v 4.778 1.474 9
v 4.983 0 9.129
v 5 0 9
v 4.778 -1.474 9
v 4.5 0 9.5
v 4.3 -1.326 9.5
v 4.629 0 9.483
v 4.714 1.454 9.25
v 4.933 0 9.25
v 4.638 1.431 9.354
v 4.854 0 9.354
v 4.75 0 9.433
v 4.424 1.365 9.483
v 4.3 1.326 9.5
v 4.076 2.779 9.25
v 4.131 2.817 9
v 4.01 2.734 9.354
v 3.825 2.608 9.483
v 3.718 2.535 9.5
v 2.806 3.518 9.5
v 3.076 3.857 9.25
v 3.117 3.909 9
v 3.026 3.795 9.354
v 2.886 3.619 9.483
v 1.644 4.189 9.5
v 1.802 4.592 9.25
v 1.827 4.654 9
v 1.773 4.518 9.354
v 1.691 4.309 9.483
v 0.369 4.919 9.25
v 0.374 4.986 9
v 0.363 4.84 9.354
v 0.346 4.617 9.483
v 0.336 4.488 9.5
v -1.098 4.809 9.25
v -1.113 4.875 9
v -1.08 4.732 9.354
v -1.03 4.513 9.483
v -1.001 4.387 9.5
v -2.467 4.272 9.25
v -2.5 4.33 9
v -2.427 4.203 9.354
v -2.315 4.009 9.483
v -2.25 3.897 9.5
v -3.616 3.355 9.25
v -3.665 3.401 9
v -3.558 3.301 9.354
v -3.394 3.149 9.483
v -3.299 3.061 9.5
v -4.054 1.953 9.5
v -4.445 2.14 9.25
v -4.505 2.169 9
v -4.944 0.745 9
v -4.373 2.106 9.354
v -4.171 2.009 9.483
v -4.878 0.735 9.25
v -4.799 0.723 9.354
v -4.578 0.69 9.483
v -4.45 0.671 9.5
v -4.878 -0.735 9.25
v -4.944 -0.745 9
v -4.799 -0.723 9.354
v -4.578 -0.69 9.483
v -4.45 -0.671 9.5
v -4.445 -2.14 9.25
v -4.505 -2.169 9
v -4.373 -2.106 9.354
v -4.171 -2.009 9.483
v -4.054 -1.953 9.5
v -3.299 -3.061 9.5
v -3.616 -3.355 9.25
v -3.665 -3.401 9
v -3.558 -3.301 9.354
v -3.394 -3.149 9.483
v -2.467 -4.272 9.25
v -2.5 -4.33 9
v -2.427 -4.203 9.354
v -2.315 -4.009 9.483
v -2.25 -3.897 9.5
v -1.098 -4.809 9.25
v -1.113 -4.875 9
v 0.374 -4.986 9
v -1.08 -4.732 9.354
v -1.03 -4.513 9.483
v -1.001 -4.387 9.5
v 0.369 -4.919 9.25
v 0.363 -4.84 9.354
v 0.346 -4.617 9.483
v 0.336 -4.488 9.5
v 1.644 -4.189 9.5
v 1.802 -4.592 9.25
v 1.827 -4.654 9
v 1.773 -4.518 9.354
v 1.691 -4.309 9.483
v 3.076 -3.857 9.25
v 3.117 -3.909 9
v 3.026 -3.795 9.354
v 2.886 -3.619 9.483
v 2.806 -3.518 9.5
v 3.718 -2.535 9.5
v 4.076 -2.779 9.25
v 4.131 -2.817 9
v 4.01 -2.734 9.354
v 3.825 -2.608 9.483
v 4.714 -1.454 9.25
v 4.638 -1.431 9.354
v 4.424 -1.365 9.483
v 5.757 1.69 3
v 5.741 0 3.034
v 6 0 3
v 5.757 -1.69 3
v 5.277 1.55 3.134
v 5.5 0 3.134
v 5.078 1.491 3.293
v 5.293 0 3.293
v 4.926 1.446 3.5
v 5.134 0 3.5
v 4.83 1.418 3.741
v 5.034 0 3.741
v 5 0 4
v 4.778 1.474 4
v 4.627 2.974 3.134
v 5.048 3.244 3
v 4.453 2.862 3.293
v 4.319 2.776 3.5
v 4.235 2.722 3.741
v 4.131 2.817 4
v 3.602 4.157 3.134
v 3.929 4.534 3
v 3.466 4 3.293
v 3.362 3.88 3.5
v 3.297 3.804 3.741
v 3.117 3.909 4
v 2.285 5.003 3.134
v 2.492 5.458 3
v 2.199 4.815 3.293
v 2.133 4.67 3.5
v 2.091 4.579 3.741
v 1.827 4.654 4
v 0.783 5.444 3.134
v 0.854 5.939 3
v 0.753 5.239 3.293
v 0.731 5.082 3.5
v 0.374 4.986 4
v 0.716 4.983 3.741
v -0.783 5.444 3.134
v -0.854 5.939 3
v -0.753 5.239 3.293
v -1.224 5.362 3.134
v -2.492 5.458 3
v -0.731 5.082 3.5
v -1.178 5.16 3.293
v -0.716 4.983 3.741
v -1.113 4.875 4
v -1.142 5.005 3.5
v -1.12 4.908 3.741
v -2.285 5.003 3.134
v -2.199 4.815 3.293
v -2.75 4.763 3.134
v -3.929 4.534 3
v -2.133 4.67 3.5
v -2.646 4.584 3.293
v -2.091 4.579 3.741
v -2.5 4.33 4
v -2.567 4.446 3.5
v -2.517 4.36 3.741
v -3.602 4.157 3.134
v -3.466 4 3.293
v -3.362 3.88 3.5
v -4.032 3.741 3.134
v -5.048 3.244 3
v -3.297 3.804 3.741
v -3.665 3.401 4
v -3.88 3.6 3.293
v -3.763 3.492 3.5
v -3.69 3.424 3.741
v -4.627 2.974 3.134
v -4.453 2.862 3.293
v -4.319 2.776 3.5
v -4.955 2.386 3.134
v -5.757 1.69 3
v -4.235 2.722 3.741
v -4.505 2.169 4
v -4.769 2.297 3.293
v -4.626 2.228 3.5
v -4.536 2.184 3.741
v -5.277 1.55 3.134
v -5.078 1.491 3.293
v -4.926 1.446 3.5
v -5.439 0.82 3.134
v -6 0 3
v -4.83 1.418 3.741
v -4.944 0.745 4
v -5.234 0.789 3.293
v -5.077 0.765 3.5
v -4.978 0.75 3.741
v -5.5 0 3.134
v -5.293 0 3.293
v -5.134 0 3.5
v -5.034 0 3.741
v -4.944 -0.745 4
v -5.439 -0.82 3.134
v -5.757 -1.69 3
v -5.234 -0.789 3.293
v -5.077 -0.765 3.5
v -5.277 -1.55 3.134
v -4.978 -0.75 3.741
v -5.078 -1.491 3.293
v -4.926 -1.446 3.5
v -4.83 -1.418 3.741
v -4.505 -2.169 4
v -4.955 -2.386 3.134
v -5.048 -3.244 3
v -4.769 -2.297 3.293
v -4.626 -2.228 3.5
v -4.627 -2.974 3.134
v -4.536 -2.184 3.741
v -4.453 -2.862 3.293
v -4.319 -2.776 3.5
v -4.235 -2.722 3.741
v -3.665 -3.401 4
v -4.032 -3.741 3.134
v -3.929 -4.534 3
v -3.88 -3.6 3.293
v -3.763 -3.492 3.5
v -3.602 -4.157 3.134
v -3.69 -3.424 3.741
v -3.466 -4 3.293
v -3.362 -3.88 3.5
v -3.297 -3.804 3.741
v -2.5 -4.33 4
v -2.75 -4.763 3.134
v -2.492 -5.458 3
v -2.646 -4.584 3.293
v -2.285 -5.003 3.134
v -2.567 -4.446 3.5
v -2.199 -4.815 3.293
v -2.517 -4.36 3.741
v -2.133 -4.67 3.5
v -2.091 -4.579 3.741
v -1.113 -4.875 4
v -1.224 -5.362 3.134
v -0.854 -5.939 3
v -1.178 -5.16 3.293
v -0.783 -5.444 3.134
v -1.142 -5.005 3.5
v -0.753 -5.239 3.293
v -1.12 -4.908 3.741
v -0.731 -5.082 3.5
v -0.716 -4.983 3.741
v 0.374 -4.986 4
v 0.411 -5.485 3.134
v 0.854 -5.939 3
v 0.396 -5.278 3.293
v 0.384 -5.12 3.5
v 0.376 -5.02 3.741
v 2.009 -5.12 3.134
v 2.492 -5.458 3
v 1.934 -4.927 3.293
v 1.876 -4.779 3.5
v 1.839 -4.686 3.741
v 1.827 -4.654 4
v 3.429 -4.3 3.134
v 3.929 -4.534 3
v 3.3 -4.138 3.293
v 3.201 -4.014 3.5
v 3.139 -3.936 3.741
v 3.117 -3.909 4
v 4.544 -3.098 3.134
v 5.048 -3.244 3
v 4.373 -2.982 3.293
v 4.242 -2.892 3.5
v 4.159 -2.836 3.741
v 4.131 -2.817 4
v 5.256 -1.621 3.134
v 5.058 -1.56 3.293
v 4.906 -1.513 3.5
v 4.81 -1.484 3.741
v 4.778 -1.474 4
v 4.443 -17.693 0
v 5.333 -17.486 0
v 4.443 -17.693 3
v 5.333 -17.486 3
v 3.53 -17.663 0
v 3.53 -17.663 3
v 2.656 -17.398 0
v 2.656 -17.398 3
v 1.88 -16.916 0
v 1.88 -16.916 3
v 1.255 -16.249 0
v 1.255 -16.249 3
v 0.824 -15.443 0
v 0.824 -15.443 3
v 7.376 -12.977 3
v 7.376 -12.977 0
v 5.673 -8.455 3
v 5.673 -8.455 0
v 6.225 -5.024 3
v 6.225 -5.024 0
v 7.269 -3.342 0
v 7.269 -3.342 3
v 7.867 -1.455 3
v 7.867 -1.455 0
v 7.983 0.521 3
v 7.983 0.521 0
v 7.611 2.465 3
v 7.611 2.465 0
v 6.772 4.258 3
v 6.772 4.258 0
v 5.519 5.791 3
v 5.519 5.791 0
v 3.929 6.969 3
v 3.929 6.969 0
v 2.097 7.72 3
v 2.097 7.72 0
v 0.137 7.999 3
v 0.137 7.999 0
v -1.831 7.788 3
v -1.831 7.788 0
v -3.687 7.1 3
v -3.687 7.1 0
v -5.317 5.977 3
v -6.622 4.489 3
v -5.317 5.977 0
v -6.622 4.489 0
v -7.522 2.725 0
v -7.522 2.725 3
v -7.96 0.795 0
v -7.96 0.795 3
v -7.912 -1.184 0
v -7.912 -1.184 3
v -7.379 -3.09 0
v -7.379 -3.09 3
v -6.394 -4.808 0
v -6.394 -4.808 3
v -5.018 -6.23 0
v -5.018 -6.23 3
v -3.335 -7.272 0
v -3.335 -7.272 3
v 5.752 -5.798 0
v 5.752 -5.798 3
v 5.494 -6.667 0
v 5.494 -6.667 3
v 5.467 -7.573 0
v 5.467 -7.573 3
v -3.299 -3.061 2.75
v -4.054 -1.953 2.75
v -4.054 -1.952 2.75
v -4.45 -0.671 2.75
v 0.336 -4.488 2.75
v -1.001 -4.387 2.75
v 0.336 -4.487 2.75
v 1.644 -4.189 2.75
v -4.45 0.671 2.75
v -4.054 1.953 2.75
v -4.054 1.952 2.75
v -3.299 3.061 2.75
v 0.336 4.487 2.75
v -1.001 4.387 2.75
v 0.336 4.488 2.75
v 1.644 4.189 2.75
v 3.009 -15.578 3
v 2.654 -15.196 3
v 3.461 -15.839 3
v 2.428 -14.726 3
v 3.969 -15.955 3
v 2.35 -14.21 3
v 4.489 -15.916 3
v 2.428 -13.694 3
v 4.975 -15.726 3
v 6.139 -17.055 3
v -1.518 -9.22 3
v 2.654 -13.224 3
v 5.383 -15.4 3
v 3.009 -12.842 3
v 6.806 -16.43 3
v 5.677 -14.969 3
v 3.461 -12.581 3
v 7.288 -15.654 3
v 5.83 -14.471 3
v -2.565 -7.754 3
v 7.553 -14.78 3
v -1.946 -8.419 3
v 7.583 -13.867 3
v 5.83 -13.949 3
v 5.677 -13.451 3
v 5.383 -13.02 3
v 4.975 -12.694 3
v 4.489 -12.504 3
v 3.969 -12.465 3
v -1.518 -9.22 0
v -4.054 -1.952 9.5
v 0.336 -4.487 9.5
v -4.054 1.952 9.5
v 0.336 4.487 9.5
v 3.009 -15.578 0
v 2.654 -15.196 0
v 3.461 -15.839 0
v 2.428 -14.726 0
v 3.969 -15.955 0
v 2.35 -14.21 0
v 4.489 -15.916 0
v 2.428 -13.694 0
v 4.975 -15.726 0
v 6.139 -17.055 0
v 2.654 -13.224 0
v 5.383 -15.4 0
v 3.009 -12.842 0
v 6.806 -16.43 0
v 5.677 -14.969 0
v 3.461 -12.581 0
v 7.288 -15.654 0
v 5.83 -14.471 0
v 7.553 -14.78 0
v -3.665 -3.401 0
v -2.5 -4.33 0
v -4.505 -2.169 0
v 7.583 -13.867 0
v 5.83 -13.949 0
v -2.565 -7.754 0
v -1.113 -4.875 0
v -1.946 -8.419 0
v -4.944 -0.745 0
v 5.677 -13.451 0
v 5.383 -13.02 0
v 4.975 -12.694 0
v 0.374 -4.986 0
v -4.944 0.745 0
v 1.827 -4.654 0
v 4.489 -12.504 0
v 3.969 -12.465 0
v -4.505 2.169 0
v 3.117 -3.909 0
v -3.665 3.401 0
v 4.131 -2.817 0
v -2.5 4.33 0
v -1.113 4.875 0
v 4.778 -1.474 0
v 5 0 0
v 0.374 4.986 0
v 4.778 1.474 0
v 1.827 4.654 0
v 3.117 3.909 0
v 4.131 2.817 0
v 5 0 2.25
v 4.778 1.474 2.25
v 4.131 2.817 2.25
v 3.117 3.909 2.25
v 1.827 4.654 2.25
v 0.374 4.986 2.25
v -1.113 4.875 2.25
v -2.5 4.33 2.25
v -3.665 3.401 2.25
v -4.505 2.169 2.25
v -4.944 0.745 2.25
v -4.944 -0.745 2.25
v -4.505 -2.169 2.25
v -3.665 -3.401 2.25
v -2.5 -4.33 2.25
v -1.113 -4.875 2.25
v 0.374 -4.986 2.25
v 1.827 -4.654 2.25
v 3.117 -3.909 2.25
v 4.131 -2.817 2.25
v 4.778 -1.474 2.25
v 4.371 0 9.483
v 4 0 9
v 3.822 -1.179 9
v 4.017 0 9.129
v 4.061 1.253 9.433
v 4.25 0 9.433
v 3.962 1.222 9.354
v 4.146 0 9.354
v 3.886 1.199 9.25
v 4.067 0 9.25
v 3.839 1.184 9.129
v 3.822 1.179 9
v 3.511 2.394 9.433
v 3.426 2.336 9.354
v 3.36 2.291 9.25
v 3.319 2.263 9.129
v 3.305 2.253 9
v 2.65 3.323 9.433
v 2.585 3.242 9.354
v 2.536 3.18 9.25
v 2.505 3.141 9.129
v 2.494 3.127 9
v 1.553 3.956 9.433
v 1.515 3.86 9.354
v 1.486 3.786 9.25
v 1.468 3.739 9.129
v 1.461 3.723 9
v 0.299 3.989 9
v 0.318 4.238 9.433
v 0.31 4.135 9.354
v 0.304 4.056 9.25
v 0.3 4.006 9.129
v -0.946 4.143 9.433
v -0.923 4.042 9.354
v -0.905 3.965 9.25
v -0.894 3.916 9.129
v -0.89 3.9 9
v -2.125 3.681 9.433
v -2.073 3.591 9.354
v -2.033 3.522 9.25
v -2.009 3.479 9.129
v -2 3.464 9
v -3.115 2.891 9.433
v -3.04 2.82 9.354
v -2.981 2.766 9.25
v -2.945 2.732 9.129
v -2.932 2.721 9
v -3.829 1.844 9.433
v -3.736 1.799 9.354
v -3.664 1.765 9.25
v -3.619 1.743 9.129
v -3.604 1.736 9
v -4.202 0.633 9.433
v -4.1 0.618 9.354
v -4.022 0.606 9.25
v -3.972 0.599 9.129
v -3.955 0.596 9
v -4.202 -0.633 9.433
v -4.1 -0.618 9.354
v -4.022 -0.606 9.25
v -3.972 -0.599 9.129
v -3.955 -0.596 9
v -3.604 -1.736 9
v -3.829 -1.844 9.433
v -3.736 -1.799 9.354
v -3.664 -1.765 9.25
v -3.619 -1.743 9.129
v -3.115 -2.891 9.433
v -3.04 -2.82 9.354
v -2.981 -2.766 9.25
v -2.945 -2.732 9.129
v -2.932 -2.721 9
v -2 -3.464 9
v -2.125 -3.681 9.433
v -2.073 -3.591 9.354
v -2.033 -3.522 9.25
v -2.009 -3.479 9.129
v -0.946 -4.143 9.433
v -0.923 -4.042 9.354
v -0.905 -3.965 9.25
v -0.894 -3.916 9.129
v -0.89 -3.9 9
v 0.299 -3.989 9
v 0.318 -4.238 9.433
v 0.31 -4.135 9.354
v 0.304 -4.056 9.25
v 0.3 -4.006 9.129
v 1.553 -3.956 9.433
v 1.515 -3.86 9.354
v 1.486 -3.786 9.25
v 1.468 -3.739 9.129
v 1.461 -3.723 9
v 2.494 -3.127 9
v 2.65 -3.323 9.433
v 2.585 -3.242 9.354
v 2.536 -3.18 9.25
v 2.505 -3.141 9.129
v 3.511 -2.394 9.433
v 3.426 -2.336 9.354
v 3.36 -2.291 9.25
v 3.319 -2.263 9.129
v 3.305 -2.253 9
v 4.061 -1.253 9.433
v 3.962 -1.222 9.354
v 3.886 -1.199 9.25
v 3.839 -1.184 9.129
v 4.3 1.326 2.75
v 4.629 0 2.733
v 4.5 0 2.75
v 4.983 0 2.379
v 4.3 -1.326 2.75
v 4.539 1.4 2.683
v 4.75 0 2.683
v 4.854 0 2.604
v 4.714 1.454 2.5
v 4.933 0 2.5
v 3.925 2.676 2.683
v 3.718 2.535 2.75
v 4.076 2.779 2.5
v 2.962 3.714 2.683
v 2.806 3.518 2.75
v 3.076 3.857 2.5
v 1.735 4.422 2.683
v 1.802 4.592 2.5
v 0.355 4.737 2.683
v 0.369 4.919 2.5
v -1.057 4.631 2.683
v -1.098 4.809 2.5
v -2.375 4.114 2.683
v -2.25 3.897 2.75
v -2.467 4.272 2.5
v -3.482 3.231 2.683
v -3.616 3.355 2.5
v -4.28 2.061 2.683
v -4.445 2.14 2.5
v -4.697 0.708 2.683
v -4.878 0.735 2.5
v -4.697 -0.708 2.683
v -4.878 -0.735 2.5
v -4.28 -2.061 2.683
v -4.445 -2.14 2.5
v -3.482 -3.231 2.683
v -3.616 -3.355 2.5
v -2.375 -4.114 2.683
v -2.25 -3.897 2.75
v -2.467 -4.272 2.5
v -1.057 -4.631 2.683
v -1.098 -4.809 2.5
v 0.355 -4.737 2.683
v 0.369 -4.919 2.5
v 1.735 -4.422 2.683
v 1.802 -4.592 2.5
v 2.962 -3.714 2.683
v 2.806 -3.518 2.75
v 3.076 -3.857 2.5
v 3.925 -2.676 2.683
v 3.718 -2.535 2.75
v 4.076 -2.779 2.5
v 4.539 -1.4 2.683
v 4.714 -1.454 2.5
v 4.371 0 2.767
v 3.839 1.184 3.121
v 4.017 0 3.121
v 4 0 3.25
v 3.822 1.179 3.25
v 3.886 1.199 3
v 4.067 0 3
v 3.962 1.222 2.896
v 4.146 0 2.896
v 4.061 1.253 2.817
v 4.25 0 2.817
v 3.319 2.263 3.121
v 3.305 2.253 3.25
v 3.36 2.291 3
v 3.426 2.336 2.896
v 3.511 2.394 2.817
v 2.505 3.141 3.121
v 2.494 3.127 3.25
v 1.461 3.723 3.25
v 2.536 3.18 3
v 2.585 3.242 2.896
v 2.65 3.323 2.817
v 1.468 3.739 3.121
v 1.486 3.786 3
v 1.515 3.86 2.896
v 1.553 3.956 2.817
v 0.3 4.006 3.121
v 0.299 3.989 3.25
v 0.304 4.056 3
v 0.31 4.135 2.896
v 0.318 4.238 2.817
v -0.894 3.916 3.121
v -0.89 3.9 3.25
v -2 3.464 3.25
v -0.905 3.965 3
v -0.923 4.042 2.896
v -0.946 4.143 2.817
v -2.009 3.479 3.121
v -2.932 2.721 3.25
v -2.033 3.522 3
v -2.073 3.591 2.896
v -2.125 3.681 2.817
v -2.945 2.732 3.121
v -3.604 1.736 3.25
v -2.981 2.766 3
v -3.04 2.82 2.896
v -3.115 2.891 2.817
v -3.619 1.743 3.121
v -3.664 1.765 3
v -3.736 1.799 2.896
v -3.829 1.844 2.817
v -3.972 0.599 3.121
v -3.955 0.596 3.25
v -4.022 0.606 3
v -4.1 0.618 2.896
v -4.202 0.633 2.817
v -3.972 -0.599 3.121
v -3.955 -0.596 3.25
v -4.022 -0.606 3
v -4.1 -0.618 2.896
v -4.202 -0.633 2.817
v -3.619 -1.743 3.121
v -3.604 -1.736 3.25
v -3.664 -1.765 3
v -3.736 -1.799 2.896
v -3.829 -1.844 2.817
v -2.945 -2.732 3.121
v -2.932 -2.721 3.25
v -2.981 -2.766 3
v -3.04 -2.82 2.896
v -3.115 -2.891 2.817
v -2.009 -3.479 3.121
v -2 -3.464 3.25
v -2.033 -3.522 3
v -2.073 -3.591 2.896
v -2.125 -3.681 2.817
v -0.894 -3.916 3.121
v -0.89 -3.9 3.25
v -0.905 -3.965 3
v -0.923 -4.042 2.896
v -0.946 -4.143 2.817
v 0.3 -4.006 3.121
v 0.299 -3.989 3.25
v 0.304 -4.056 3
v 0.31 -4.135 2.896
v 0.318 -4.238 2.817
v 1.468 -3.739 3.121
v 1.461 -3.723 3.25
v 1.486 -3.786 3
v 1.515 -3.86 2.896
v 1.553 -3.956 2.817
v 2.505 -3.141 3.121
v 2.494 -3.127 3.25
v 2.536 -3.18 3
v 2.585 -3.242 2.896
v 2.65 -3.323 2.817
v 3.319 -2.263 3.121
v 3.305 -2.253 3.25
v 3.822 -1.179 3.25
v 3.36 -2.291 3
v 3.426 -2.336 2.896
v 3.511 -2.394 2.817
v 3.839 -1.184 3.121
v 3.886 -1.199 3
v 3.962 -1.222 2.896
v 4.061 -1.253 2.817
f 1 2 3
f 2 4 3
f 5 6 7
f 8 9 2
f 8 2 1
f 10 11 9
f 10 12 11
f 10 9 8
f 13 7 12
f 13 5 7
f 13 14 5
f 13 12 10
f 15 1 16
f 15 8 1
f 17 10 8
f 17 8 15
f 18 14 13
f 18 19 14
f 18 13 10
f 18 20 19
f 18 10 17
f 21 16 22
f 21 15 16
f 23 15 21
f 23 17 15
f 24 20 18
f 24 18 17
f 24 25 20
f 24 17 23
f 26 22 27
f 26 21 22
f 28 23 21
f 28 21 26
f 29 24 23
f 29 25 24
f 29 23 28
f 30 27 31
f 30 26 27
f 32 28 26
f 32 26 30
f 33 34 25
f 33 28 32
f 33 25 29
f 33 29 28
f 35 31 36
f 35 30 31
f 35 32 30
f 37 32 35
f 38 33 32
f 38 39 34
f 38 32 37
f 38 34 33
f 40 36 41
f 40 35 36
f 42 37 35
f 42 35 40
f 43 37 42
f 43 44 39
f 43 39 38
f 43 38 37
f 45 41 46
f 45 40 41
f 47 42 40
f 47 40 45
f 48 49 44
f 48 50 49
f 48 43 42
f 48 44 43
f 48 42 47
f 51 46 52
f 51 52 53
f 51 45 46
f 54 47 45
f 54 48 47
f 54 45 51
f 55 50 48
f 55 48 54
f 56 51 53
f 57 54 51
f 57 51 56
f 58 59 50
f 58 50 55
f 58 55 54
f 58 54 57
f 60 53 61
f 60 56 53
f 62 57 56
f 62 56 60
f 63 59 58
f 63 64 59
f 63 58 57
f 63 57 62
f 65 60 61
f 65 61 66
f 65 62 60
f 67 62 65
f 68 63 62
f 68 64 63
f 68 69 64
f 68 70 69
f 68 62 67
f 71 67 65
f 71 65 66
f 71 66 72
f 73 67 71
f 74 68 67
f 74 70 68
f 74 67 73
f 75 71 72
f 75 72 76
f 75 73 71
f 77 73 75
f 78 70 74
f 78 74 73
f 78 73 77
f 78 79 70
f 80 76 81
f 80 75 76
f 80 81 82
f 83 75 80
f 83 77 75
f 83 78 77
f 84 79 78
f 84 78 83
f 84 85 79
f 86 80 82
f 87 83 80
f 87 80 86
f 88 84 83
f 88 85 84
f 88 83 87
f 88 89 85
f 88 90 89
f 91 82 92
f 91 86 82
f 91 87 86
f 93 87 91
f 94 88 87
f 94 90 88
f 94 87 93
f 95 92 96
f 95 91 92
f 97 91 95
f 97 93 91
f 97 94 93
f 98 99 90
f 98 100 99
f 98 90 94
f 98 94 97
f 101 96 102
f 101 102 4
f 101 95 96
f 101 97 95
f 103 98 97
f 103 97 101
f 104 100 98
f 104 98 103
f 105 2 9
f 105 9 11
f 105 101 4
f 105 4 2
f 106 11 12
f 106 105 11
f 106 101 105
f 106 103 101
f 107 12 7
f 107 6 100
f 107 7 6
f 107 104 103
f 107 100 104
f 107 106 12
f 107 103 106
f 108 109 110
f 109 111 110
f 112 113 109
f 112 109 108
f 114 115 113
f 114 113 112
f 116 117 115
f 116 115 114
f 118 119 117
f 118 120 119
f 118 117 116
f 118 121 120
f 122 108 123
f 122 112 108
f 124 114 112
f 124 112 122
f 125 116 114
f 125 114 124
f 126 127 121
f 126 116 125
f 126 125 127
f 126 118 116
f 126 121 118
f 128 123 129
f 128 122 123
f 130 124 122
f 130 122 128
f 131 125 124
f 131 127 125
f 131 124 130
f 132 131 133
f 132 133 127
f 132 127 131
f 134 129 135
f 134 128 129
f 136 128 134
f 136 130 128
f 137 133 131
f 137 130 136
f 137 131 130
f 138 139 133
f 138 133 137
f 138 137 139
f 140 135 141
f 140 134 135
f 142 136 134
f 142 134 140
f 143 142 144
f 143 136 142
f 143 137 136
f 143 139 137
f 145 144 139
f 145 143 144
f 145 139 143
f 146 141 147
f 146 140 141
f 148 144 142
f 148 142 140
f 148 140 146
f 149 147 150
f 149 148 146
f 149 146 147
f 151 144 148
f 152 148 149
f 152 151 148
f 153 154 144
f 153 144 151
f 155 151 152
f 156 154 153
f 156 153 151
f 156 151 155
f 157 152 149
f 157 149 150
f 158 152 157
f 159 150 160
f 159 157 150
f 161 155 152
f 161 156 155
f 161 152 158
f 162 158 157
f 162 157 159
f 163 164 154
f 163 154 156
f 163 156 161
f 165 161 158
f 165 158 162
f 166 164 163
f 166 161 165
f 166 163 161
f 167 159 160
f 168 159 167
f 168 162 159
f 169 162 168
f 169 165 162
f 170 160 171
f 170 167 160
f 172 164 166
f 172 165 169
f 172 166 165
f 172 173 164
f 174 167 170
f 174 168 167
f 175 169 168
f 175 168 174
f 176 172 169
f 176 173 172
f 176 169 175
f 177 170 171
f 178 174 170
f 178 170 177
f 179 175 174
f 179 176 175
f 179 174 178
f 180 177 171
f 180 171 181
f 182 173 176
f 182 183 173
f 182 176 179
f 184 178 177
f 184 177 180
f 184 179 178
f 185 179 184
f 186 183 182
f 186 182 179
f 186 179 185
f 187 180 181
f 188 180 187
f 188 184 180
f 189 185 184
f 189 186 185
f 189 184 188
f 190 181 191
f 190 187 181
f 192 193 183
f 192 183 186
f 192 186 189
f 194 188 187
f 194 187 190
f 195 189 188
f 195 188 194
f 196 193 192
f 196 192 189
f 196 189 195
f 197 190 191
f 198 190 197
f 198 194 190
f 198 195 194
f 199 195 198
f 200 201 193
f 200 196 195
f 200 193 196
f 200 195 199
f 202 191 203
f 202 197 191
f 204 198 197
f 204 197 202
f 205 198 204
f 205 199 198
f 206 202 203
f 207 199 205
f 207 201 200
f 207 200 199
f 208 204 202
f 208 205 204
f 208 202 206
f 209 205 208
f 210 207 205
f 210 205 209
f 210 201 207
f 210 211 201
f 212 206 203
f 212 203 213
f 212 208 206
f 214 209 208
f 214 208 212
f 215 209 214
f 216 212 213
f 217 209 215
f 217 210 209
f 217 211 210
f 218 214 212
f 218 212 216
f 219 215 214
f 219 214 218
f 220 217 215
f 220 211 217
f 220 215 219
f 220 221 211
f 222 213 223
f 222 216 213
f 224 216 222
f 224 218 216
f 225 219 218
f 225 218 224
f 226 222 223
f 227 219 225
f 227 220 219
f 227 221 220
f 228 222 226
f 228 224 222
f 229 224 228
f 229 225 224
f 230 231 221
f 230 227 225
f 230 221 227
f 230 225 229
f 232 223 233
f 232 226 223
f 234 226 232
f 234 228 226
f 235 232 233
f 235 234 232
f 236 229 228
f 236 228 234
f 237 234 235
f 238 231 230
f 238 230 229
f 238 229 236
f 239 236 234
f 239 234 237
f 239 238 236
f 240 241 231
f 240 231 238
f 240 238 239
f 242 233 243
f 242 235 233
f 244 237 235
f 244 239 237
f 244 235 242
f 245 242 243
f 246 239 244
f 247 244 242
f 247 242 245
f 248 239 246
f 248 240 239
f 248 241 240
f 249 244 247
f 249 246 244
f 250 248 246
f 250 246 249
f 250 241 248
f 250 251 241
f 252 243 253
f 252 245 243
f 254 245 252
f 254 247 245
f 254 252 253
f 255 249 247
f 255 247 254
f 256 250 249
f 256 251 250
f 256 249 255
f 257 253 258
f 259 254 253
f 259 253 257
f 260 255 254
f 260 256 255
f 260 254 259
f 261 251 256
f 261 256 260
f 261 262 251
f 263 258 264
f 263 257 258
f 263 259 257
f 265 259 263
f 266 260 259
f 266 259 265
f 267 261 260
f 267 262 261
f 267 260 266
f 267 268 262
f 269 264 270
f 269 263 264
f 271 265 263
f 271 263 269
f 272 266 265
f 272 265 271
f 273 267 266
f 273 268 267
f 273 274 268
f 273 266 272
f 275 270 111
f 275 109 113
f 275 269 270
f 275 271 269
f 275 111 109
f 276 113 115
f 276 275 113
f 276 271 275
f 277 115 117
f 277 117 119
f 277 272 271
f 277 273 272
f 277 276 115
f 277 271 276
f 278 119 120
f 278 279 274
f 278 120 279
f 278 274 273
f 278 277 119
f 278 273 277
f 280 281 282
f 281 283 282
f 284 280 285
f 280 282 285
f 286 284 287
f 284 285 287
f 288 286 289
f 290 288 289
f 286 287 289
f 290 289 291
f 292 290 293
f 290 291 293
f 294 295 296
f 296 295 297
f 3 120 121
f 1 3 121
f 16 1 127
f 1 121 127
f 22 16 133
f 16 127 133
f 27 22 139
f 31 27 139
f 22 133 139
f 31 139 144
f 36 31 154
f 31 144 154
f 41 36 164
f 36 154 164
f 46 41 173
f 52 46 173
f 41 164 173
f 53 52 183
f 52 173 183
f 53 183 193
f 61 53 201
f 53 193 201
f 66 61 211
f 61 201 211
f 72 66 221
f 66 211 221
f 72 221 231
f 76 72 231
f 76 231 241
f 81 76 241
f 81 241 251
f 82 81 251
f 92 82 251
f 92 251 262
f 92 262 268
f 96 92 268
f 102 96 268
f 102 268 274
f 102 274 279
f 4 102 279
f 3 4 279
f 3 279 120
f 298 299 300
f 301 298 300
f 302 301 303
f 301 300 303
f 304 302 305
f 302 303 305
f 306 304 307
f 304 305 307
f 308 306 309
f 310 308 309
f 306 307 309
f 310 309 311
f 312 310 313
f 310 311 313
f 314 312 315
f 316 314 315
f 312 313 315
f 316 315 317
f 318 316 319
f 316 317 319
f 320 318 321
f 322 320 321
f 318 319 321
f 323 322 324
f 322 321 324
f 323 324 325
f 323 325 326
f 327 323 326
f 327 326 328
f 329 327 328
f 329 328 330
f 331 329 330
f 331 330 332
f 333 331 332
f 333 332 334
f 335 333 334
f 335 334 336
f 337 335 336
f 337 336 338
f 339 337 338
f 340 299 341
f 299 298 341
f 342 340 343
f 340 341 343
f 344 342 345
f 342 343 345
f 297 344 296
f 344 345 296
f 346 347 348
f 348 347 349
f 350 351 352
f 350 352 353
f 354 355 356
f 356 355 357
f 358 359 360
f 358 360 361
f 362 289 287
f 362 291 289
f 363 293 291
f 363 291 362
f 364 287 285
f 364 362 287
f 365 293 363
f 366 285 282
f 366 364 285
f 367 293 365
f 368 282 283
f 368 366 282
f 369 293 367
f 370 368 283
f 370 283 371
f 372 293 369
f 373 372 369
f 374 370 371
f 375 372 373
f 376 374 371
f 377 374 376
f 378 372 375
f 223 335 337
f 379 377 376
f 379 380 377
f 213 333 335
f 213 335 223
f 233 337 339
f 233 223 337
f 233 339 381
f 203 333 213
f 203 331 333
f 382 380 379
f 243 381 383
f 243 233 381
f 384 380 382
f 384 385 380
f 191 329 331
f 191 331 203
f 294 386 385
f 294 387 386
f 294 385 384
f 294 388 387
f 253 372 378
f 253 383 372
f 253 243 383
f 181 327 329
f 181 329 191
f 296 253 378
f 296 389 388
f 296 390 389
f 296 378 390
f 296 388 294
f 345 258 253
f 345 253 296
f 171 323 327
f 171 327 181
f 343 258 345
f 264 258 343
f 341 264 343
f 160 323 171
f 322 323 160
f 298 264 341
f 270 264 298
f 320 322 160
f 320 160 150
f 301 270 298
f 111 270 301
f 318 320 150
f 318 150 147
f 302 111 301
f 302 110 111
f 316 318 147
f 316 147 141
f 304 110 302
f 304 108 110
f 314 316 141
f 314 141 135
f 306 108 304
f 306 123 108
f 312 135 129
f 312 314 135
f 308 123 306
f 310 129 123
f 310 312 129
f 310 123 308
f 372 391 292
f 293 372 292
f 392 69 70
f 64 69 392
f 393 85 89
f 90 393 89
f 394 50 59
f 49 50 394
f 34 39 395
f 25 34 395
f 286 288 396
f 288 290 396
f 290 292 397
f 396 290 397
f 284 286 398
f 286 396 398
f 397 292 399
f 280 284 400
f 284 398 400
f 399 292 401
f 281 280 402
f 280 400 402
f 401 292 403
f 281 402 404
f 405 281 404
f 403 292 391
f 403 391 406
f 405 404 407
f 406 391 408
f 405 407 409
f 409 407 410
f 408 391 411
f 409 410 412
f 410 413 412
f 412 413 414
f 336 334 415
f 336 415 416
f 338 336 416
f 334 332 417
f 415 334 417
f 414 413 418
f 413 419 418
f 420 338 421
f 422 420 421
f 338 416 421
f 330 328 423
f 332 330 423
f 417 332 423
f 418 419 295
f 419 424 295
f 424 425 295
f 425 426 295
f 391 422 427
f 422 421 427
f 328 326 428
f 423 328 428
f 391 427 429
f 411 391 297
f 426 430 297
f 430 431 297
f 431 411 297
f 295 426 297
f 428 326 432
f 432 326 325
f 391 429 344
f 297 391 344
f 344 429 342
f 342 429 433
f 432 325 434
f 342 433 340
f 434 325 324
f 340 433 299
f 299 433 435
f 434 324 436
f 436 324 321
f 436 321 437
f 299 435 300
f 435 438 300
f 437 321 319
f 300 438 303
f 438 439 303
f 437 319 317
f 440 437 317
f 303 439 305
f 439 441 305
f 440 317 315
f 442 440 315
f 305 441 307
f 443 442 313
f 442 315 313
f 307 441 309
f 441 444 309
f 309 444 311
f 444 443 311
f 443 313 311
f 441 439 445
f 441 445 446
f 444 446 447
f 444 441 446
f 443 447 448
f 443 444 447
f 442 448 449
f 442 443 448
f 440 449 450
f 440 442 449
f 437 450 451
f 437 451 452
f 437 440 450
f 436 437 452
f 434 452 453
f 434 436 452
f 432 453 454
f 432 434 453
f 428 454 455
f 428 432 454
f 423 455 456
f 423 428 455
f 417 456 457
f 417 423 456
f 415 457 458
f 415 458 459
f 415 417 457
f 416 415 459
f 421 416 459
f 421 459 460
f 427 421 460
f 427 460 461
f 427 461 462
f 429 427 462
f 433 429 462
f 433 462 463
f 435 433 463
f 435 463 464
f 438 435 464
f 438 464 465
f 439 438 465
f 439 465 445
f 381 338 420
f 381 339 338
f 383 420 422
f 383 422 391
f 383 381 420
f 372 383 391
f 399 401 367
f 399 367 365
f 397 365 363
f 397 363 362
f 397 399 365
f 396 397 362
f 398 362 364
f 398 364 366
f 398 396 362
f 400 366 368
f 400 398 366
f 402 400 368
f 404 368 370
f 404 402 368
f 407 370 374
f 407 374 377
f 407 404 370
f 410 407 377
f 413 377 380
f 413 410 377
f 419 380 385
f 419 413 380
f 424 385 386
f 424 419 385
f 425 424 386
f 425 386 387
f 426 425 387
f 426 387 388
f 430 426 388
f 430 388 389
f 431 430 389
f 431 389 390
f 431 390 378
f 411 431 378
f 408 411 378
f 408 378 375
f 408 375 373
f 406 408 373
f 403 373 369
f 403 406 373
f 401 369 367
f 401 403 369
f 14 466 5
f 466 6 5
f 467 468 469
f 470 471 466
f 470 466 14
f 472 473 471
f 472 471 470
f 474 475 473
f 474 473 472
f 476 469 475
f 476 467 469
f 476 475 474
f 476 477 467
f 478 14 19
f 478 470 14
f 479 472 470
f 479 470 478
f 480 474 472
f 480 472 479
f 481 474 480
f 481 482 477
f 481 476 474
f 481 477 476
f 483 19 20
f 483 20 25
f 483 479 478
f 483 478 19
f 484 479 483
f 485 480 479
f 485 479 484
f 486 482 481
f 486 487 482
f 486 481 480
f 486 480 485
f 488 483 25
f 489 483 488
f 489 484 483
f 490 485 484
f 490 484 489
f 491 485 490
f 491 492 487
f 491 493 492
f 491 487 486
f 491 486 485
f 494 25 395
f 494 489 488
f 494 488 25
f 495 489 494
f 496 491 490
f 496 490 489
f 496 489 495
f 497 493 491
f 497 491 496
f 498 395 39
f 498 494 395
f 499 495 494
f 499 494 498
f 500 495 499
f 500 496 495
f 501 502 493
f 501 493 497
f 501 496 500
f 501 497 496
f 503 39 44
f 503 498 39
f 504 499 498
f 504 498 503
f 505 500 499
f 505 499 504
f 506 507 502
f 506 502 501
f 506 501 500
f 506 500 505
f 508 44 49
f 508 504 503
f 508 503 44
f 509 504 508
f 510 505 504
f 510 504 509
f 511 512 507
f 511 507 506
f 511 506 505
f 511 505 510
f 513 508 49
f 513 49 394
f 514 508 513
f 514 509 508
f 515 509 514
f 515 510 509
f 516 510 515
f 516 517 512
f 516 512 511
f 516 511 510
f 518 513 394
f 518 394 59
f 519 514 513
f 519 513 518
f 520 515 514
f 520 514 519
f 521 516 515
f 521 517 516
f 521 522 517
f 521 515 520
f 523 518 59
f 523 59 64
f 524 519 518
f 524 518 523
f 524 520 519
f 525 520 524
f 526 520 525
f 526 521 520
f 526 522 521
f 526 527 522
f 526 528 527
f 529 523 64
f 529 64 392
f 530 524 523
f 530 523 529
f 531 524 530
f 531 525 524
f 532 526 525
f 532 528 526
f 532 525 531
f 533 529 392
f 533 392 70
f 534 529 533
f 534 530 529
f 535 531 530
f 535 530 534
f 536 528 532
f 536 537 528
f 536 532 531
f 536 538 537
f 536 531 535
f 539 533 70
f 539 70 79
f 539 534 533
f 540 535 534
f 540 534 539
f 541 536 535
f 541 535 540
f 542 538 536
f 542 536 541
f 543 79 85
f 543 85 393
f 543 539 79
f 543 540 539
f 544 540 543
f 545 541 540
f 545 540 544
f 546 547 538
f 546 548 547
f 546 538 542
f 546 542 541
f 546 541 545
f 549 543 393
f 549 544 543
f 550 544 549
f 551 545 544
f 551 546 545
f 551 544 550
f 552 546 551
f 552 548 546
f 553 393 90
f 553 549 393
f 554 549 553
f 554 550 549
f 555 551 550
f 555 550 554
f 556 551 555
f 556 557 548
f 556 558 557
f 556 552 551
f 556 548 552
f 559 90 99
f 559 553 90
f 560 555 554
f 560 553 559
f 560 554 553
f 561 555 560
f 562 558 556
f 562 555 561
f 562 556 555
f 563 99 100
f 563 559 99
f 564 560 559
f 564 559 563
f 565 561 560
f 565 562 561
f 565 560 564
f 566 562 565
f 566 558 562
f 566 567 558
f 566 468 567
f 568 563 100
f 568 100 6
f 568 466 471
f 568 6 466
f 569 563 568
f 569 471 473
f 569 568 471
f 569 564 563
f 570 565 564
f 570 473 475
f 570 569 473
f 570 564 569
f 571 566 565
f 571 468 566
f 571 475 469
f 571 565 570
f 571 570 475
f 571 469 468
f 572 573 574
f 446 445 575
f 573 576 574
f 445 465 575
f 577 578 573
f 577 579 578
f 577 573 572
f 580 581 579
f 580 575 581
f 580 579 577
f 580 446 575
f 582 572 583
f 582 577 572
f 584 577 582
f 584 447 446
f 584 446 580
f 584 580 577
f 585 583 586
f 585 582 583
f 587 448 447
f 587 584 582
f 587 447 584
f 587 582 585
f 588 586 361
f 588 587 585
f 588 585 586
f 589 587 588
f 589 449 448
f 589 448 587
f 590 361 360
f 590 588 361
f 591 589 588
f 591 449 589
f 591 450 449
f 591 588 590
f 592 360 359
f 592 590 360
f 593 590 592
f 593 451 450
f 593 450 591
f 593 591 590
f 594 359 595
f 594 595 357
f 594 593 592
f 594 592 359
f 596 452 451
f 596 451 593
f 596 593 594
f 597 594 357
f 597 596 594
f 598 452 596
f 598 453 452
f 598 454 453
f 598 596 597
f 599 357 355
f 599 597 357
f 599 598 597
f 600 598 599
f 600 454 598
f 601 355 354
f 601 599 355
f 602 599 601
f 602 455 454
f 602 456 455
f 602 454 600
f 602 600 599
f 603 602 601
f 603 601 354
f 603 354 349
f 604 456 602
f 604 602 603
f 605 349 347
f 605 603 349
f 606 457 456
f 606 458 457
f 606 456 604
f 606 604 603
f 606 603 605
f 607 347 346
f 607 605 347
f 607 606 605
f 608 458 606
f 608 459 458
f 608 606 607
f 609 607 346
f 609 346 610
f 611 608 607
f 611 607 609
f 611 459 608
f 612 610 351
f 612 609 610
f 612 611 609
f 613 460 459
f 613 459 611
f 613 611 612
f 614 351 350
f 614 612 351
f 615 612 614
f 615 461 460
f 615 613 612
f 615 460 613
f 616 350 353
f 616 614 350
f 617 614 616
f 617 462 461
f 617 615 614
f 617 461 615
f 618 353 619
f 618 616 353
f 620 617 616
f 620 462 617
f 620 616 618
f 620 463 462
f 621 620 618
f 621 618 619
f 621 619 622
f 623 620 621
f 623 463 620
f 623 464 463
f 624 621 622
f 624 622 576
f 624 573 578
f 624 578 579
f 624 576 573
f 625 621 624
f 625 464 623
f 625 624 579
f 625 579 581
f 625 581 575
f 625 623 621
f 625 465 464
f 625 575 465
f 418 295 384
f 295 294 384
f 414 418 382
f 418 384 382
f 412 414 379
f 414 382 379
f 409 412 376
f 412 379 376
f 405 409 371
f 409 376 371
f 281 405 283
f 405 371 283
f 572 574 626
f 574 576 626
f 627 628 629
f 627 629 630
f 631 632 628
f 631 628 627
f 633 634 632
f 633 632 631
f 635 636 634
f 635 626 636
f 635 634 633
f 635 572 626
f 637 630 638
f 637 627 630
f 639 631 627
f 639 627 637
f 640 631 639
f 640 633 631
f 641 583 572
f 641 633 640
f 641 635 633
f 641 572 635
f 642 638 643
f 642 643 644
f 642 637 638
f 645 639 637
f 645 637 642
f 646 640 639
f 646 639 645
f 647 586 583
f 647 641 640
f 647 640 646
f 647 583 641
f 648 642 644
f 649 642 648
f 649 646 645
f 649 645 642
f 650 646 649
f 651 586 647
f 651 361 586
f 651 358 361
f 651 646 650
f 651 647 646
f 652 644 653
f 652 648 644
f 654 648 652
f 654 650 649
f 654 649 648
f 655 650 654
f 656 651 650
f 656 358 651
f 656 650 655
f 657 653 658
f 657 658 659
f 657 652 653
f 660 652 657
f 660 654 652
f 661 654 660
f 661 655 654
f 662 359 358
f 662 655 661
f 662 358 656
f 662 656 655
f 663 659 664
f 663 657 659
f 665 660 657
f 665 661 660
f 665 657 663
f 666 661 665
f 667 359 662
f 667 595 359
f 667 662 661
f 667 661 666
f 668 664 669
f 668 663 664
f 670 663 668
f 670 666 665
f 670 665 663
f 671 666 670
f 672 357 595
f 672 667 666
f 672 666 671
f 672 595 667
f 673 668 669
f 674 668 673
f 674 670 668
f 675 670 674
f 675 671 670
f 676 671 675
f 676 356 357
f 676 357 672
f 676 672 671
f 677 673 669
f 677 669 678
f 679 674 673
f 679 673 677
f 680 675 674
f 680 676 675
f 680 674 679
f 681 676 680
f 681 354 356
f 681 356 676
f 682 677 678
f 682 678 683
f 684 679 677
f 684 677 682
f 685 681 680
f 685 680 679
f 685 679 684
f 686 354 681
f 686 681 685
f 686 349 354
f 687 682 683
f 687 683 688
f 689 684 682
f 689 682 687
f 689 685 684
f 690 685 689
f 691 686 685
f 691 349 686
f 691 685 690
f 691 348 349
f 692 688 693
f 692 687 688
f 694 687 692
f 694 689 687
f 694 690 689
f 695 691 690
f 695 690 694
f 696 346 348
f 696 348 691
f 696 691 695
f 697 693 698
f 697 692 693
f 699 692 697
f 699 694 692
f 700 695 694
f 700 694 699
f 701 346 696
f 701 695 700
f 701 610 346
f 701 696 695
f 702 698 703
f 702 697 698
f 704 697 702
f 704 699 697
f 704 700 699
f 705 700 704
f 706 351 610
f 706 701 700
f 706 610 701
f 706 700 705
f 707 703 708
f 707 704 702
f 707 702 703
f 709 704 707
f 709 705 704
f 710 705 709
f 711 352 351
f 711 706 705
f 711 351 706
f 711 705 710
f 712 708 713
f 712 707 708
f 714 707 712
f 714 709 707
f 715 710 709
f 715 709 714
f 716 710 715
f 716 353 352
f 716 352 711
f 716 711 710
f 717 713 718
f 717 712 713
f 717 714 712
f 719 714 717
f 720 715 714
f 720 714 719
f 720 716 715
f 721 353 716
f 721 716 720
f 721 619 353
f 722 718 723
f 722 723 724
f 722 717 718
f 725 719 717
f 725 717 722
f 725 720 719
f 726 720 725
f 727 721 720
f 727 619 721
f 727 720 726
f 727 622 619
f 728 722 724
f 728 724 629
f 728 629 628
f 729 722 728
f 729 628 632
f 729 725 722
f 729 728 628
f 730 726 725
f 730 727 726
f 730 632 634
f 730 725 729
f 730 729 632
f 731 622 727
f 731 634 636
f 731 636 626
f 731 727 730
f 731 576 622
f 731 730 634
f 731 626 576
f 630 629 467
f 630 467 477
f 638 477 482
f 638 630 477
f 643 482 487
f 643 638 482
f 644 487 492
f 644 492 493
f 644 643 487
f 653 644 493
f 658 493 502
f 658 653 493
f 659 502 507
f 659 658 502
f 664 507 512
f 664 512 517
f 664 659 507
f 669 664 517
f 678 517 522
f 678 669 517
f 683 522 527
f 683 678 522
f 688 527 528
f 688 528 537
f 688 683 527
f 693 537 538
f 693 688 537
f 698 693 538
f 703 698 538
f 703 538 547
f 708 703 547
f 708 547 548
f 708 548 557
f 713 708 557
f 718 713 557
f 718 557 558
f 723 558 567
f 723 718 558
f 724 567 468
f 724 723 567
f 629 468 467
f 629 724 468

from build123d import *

# Parameters (mm, degrees)
ESQUISSE1_R             = 8
ESQUISSE1_R_2           = 5
BOSS_EXTRU_1_DEPTH      = 3
BOSS_EXTRU_2_DEPTH      = 6.5
BOSS_EXTRU_2_DEPTH_BACK = 0.25
ESQUISSE2_R             = 5
ESQUISSE2_R_2           = 4
CONG_2_R                = 0.5
ESQUISSE4_R             = 1.75
BOSS_EXTRU_4_DEPTH      = 3
CONG_3_R                = 3.5
CONG_4_R                = 1


with BuildPart() as part:
    # Esquisse1 → Boss.-Extru.1 (new body)
    with BuildSketch(Plane.XY):
        Circle(ESQUISSE1_R)
        Circle(ESQUISSE1_R_2, mode=Mode.SUBTRACT)
    extrude(amount=BOSS_EXTRU_1_DEPTH)

    # Esquisse2 → Boss.-Extru.2 (add, two sides: drawn at the far end of the back side and taken through both)
    with BuildSketch(Plane.XY.offset(3).offset(-BOSS_EXTRU_2_DEPTH_BACK)):
        Circle(ESQUISSE2_R)
        Circle(ESQUISSE2_R_2, mode=Mode.SUBTRACT)
    extrude(amount=BOSS_EXTRU_2_DEPTH + BOSS_EXTRU_2_DEPTH_BACK)

    # Congé2
    cong_2_edges = [part.edges().sort_by_distance(p)[0] for p in [
        (-5, 0, 2.75),
        (-4, 0, 2.75),
        (-4, 0, 9.5),
        (-5, 0, 9.5),
    ]]
    fillet(cong_2_edges, radius=CONG_2_R - 0.0001)  # a hair under: the kernel refuses the full size

    # Esquisse4 → Boss.-Extru.4 (add)
    with BuildSketch(Plane.XY):
        with BuildLine():
            ThreePointArc((4.877548317, -6.341097887), (1.559913464, -7.846443142), (-2.081227097, -7.724538418))
            Line((-2.081227097, -7.724538418), (2.057501229, -18.71868038))
            Line((2.057501229, -18.71868038), (8.60868038, -16.252498771))
            Line((8.60868038, -16.252498771), (4.877548317, -6.341097887))
        make_face()
        with Locations(Location((4.1, -14.21, 0), (0, 0, 180))):
            Circle(ESQUISSE4_R, mode=Mode.SUBTRACT)
    extrude(amount=BOSS_EXTRU_4_DEPTH)

    # Congé3
    cong_3_edges = [part.edges().sort_by_distance(p)[0] for p in [
        (4.877548317, -6.341097887, 1.5),
        (-2.081227097, -7.724538418, 1.5),
        (2.057501229, -18.71868038, 1.5),
        (8.60868038, -16.252498771, 1.5),
    ]]
    fillet(cong_3_edges, radius=CONG_3_R - 0.0001)  # a hair under: the kernel refuses the full size

    # Congé4
    cong_4_edges = [part.edges().sort_by_distance(p)[0] for p in [
        (-5, 0, 3),
    ]]
    fillet(cong_4_edges, radius=CONG_4_R)


solid = part.part
